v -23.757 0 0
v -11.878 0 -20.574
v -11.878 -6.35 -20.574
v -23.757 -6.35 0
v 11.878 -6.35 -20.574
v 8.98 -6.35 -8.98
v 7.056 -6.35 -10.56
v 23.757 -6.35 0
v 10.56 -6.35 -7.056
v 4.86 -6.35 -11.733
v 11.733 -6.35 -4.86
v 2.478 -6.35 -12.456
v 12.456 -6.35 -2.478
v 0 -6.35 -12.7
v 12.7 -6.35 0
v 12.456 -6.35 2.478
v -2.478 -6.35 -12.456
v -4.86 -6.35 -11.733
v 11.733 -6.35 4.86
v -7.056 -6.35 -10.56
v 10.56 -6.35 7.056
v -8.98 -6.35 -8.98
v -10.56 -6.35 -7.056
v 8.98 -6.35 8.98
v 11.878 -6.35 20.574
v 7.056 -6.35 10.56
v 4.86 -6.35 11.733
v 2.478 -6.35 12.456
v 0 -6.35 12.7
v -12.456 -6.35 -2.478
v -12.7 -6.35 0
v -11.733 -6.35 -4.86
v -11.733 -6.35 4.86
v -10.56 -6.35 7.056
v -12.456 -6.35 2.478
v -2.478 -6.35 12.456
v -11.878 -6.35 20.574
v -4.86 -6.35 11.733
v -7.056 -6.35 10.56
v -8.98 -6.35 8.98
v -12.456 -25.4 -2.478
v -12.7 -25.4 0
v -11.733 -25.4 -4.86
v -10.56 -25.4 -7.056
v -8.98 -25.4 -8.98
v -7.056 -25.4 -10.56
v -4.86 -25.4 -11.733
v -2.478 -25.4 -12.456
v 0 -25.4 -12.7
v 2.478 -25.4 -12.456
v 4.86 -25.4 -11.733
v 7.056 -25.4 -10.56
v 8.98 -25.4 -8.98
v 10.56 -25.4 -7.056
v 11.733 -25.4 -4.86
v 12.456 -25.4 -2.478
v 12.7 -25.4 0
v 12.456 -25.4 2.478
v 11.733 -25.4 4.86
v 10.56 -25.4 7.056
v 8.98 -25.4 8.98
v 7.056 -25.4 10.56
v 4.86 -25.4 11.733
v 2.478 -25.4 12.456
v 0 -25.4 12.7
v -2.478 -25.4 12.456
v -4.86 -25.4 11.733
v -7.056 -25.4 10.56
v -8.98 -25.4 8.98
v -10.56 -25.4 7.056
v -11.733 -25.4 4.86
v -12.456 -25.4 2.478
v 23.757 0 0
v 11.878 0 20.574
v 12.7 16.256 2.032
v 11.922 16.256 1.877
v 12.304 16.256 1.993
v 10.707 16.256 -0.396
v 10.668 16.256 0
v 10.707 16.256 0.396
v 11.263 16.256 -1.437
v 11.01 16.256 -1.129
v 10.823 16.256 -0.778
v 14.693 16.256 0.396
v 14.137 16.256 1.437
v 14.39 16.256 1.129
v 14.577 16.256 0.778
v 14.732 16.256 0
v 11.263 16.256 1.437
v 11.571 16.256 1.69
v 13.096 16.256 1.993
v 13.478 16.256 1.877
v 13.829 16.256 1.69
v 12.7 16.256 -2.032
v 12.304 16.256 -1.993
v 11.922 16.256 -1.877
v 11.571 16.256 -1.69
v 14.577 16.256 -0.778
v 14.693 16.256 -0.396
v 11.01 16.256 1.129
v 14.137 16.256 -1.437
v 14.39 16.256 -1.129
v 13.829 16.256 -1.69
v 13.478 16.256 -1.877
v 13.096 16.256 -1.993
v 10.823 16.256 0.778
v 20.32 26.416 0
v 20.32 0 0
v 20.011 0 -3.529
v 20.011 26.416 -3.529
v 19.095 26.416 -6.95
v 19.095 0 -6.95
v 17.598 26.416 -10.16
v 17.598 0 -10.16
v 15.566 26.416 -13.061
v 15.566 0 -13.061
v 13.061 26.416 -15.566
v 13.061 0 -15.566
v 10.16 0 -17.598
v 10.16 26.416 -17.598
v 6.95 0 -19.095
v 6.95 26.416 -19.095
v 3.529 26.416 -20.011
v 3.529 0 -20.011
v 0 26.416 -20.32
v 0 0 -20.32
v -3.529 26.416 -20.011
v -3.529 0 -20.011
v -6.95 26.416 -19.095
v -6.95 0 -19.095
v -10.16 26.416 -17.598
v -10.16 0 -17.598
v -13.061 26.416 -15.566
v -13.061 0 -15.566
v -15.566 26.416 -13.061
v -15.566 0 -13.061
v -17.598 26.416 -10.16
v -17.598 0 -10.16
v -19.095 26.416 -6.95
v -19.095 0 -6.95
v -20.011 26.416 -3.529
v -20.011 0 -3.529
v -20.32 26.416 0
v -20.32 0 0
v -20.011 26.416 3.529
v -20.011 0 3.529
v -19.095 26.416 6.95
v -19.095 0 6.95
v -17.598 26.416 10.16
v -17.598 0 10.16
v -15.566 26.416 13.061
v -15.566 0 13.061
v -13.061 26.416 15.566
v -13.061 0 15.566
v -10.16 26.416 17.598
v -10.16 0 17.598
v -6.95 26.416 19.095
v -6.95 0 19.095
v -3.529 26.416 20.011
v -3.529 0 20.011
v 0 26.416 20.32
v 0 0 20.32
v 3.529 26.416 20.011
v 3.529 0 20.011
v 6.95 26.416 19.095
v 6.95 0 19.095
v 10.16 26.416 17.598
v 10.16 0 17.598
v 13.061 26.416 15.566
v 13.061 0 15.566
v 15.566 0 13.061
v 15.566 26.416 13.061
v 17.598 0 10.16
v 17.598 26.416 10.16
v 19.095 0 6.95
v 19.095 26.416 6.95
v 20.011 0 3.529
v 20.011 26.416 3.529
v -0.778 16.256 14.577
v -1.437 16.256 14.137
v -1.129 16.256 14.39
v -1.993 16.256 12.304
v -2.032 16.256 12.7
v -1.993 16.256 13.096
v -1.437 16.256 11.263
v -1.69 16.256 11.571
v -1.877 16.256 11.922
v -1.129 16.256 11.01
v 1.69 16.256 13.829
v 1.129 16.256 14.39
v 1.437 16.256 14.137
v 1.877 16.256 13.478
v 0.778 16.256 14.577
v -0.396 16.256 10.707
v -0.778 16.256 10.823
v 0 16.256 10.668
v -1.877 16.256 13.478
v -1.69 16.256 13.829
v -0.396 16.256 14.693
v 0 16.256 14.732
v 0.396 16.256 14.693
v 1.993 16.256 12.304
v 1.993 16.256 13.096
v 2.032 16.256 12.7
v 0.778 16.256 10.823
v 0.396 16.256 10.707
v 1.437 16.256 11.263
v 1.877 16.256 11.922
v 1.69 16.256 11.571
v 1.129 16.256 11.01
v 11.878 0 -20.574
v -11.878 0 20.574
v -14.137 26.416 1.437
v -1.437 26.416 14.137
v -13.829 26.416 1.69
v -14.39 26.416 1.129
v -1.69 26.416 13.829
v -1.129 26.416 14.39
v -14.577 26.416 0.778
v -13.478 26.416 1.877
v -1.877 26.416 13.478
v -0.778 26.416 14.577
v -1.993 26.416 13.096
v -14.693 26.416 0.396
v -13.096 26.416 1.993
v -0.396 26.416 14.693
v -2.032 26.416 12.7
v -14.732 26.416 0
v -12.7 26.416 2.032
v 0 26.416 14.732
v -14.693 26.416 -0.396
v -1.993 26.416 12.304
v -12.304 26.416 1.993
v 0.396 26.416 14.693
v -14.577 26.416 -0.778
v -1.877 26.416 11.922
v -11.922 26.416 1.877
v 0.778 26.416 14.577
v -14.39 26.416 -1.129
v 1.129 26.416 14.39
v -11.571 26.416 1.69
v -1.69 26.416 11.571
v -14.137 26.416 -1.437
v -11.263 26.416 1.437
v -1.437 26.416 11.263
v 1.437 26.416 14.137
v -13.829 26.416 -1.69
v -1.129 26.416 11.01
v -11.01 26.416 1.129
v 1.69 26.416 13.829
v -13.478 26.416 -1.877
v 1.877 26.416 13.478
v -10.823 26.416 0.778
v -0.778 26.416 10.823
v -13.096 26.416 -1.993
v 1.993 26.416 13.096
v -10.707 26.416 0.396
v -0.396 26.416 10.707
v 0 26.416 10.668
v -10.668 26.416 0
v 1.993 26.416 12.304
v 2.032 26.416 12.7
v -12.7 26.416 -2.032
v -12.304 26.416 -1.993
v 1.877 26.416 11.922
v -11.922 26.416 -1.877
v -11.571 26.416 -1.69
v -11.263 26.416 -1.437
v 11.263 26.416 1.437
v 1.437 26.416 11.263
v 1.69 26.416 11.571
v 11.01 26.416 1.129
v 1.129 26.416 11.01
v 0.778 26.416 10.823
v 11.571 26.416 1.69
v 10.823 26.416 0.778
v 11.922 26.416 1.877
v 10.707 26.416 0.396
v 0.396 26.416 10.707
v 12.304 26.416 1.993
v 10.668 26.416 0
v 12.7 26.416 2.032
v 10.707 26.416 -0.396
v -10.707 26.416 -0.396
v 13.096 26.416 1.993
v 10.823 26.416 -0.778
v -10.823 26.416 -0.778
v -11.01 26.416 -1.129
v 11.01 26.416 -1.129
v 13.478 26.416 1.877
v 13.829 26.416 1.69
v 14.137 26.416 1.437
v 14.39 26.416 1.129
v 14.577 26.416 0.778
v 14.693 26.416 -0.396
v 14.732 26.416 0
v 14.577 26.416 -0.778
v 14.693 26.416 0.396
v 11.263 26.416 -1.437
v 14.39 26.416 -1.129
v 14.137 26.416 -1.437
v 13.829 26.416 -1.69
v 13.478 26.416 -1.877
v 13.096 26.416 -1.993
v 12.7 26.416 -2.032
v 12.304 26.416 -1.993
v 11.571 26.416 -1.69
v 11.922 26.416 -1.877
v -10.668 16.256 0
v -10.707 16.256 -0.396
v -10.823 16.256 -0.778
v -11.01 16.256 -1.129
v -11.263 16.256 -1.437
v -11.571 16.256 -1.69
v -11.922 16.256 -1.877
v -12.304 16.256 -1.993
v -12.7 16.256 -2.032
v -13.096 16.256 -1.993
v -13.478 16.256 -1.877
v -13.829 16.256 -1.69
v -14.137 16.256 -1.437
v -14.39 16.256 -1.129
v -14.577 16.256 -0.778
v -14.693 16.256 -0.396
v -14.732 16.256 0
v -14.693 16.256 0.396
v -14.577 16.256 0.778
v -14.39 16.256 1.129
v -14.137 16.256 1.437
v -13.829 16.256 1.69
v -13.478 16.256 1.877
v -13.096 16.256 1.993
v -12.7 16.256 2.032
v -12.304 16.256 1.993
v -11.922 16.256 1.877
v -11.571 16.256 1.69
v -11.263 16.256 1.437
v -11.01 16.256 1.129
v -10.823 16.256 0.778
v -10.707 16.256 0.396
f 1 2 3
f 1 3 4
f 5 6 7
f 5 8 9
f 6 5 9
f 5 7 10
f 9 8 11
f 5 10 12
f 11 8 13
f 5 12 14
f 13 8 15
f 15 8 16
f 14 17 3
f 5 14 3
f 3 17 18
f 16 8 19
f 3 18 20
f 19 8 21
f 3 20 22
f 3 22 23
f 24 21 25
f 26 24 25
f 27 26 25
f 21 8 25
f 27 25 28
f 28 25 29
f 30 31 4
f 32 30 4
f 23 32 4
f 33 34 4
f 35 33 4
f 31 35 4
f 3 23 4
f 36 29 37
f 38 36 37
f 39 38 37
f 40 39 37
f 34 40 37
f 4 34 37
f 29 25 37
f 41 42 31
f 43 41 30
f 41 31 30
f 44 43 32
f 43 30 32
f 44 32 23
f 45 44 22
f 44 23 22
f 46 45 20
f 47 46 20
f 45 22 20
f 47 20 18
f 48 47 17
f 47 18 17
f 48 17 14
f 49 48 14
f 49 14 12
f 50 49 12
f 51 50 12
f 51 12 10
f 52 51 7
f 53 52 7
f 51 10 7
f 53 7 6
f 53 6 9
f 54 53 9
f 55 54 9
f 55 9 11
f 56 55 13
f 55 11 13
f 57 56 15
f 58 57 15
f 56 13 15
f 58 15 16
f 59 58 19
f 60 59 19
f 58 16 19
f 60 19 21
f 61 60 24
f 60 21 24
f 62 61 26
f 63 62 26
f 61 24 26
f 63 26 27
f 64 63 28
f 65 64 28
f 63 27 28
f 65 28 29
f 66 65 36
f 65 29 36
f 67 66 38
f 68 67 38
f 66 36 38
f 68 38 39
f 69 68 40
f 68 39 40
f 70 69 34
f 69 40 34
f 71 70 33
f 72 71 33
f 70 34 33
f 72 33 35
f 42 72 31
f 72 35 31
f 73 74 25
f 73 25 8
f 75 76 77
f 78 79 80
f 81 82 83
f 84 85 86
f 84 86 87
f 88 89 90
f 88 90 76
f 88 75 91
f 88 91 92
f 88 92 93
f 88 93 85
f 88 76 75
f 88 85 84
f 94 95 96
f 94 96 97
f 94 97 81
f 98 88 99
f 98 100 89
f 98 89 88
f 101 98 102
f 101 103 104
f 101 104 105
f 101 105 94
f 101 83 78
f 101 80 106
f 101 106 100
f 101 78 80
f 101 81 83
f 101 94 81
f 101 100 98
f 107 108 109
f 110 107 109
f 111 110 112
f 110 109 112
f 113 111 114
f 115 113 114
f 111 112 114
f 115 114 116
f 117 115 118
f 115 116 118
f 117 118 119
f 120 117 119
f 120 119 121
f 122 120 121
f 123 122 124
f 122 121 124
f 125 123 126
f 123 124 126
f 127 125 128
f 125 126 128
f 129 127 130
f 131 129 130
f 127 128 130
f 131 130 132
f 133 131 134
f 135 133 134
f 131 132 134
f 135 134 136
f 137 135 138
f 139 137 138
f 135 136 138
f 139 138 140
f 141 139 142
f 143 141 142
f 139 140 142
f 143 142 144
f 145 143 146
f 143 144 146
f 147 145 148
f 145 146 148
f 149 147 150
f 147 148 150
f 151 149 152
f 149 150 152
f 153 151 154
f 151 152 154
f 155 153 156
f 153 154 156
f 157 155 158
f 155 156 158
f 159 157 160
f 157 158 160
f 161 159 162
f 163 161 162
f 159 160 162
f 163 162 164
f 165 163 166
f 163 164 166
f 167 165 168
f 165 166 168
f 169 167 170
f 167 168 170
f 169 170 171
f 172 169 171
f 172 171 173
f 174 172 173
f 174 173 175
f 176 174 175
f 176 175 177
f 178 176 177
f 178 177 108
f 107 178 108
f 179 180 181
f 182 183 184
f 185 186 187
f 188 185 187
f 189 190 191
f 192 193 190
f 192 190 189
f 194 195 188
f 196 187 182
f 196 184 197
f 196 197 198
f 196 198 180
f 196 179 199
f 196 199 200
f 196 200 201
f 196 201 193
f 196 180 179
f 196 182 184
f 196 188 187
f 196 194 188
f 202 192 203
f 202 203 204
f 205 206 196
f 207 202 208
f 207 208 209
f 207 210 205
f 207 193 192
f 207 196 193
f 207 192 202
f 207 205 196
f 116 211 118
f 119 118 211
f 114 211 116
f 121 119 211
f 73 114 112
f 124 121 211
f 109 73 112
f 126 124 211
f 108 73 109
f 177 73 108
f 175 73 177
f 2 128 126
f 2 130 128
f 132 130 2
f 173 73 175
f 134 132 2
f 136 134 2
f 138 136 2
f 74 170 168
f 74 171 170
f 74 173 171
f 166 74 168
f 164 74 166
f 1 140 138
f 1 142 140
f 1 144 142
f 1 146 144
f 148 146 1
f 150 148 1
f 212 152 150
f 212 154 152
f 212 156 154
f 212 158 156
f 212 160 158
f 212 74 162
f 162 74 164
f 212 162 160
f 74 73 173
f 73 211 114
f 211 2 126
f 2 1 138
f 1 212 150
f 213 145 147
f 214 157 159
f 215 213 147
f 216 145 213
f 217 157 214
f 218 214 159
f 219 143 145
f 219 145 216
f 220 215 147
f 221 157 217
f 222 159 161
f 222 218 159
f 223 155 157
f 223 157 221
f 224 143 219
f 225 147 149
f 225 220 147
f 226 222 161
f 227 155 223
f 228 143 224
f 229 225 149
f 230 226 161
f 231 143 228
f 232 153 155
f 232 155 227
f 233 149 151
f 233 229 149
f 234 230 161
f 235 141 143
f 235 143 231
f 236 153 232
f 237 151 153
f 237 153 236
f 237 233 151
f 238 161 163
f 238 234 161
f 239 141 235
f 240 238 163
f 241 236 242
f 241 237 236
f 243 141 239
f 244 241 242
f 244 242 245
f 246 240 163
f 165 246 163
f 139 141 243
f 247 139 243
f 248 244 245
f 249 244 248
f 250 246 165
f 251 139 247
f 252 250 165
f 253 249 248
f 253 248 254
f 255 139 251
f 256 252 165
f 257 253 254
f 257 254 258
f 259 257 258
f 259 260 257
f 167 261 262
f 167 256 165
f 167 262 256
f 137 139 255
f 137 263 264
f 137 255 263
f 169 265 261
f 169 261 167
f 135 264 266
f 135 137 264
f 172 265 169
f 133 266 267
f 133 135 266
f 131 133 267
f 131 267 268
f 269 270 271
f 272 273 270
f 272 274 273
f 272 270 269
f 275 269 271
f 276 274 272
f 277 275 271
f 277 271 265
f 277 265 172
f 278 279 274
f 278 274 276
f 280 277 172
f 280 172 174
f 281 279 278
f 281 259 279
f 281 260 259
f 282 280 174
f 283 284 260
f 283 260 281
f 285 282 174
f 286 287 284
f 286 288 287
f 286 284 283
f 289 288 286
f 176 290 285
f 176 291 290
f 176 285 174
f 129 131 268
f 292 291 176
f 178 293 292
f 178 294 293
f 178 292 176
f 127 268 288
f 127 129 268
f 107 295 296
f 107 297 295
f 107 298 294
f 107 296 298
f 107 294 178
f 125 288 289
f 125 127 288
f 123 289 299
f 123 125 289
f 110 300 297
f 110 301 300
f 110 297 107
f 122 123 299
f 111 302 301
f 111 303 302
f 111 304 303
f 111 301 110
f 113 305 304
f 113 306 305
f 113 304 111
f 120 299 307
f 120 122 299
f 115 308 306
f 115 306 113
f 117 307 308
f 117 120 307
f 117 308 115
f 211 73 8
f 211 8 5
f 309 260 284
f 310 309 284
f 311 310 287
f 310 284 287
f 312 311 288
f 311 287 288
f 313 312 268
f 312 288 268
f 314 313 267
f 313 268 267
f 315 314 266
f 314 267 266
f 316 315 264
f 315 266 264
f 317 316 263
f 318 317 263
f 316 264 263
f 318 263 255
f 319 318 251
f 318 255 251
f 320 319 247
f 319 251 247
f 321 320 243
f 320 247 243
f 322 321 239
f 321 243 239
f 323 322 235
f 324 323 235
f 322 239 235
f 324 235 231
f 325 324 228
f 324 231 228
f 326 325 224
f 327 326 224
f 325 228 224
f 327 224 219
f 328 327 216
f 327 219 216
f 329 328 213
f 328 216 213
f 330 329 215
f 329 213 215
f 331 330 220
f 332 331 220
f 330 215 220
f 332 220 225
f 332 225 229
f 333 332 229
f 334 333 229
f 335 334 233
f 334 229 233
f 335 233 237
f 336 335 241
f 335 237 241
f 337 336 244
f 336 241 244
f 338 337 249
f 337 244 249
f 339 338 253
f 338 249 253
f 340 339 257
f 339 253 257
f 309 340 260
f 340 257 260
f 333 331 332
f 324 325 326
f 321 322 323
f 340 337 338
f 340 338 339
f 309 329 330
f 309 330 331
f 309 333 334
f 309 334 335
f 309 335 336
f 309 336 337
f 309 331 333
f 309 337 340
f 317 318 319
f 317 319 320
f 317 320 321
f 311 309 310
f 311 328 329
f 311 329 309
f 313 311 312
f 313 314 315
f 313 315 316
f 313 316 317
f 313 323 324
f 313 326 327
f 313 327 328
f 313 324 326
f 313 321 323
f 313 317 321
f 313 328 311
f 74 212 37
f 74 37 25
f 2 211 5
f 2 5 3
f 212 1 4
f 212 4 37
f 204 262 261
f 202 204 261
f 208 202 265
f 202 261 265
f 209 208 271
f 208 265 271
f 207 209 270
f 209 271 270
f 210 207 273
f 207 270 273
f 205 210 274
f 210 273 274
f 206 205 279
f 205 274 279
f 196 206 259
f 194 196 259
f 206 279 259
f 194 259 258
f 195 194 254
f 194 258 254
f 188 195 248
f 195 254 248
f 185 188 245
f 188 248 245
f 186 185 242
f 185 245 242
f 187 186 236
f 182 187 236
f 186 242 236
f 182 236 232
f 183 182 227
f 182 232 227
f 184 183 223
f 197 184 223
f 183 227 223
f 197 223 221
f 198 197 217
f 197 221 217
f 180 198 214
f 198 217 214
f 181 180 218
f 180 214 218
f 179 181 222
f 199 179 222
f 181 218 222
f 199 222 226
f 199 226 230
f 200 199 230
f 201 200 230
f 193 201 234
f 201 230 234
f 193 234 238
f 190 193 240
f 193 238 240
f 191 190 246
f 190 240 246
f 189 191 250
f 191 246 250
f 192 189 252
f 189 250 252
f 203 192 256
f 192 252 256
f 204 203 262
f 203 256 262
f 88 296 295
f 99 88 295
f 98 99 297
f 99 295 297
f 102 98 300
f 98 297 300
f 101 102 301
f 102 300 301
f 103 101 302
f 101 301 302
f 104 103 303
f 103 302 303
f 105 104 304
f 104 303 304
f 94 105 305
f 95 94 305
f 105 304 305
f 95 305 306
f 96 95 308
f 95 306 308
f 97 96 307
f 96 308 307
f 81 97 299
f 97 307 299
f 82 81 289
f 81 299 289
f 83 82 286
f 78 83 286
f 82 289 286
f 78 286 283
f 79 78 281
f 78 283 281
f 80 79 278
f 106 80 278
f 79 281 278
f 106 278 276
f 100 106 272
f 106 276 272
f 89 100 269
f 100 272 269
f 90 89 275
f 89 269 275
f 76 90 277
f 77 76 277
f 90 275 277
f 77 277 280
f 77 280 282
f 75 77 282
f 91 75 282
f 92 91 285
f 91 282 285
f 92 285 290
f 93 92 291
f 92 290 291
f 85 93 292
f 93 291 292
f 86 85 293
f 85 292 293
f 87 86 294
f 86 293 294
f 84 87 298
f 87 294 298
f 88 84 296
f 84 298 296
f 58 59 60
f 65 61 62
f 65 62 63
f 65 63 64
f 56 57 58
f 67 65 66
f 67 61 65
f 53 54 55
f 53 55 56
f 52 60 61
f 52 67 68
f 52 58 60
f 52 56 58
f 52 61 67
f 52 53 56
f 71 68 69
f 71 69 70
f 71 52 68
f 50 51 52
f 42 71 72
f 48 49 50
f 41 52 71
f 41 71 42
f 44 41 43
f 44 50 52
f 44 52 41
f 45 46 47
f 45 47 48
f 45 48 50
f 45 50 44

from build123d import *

# Parameters (mm, degrees)
SKETCH1_R           = 20.32
BOSS_EXTRUDE1_DEPTH = 26.416
BOSS_EXTRUDE2_DEPTH = 6.35
SKETCH3_R           = 12.7
BOSS_EXTRUDE3_DEPTH = 19.05
SKETCH4_R           = 2.032
CUT_EXTRUDE1_DEPTH  = 10.16


with BuildPart() as part:
    # Sketch1 → Boss-Extrude1 (new body)
    with BuildSketch(Plane(origin=(0, 0, 0), x_dir=(1, 0, 0), z_dir=(0, 1, 0))):
        Circle(SKETCH1_R)
    extrude(amount=BOSS_EXTRUDE1_DEPTH)

    # Sketch2 → Boss-Extrude2 (add)
    with BuildSketch(Plane.XZ):
        Polygon((-11.878404438, 20.574), (11.878404438, 20.574), (23.756808877, 0), (11.878404438, -20.574), (-11.878404438, -20.574), (-23.756808877, 0), align=None)
    extrude(amount=BOSS_EXTRUDE2_DEPTH)

    # Sketch3 → Boss-Extrude3 (add)
    with BuildSketch(Plane(origin=(0, -6.35, 0), x_dir=(-1, 0, 0), z_dir=(0, -1, 0))):
        Circle(SKETCH3_R)
    extrude(amount=BOSS_EXTRUDE3_DEPTH)

    # Sketch4 → Cut-Extrude1 (cut)
    with BuildSketch(Plane(origin=(0, 26.416, 0), x_dir=(1, 0, 0), z_dir=(0, 1, 0))):
        with Locations((0, -12.7)):
            Circle(SKETCH4_R)
        with Locations((-12.7, 0)):
            Circle(SKETCH4_R)
        with Locations((12.7, 0)):
            Circle(SKETCH4_R)
    extrude(amount=-CUT_EXTRUDE1_DEPTH, mode=Mode.SUBTRACT)


solid = part.part
